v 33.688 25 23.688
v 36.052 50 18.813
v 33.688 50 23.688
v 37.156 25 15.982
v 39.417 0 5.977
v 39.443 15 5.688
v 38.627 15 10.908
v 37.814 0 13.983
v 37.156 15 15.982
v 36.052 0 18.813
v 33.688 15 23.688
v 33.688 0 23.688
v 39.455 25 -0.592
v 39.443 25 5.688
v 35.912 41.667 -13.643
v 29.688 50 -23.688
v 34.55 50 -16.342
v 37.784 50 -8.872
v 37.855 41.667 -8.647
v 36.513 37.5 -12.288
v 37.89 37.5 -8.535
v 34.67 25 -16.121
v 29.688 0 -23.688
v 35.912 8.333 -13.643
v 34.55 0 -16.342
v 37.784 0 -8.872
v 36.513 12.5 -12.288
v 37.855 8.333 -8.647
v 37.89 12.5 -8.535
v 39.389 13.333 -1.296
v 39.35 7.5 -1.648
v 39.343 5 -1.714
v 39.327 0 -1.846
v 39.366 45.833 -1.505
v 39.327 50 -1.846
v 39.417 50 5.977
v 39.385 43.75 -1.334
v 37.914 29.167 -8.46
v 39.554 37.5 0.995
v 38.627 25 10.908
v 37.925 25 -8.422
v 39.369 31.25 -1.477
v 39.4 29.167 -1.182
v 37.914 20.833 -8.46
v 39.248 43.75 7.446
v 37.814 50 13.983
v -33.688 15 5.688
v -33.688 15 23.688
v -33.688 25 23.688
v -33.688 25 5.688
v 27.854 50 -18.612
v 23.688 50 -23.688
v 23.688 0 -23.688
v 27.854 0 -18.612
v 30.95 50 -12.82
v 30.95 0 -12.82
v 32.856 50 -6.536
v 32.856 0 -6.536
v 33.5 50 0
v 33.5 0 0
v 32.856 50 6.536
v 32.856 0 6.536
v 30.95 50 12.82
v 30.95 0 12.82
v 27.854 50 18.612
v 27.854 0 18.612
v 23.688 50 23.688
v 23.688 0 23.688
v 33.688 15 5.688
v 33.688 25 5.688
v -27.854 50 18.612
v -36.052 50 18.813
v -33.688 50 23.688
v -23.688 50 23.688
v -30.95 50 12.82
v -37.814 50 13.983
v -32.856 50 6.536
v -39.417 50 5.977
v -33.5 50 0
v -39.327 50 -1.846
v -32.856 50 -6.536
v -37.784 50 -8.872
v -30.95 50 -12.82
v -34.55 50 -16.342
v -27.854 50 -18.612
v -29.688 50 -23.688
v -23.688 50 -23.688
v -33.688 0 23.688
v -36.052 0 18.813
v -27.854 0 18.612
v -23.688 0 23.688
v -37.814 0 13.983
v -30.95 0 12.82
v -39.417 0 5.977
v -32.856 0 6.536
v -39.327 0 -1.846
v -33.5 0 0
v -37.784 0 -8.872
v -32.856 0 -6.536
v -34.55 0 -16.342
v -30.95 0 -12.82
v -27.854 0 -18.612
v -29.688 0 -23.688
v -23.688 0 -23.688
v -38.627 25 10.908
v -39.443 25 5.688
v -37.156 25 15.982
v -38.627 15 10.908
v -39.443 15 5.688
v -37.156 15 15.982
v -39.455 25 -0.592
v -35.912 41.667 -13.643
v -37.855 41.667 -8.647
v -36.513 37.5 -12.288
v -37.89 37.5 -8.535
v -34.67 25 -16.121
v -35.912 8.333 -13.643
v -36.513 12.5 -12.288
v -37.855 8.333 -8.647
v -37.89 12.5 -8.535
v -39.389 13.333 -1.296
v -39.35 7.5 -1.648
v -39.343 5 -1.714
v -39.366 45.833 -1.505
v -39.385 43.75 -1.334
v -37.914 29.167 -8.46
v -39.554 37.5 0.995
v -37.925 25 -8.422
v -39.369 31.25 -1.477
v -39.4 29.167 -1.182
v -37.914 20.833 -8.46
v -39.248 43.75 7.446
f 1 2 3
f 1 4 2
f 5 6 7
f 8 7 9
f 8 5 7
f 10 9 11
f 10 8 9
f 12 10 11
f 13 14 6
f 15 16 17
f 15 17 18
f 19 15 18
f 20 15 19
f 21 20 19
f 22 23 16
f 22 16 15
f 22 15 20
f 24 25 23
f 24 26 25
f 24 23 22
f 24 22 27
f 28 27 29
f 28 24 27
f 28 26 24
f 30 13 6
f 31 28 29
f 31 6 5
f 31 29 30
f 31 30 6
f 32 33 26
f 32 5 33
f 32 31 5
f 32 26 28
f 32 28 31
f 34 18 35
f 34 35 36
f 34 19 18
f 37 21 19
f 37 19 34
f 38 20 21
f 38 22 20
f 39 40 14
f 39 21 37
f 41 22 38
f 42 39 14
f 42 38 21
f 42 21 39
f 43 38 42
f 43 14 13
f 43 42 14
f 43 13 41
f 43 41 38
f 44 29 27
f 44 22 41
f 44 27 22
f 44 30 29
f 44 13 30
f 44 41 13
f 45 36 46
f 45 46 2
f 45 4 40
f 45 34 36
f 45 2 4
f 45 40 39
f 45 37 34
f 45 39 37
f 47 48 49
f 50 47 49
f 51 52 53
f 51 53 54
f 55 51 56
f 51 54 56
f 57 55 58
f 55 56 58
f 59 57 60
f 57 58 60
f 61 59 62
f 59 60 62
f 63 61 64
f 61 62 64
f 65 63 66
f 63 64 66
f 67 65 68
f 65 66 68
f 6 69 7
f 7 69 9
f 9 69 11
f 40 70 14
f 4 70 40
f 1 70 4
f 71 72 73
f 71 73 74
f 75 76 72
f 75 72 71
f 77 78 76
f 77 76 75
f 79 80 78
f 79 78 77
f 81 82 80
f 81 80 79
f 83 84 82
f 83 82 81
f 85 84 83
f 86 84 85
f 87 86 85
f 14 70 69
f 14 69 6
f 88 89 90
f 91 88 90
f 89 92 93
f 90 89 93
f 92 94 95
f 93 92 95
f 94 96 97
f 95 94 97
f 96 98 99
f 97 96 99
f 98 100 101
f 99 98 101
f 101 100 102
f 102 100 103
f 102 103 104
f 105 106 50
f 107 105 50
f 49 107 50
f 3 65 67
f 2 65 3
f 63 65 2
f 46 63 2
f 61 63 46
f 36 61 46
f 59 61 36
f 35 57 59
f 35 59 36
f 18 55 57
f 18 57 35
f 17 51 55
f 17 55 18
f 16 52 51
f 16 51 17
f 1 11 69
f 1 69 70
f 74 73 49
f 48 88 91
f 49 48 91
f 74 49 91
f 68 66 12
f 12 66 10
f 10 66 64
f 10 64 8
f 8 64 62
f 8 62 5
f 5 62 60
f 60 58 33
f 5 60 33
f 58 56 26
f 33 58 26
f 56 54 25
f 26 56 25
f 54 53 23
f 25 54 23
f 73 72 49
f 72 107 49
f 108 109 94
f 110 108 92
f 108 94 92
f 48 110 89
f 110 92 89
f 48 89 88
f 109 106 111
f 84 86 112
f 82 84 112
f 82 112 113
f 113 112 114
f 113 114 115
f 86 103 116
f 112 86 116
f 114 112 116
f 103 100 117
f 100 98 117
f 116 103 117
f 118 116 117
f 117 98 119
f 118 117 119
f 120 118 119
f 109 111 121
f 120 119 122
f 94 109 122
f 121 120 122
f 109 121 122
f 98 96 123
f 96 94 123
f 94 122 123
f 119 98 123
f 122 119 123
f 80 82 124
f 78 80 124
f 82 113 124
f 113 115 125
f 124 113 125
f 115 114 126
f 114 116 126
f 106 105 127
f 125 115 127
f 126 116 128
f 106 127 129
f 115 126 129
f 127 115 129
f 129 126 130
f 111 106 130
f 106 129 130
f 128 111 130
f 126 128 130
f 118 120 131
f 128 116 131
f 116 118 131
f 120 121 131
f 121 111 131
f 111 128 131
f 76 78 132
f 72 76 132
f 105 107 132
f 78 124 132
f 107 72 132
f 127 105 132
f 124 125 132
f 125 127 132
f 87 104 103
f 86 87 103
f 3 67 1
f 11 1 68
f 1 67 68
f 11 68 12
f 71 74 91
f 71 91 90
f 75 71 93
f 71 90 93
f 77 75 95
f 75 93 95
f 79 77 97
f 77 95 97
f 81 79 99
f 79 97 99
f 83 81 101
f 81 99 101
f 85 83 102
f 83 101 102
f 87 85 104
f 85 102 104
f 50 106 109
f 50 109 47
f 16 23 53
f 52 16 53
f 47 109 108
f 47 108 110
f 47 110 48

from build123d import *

# Parameters (mm, degrees)
BOSS_EXTRUDE1_DEPTH   = 50
BOSS_EXTRUDE1_2_DEPTH = 50
SKETCH3_W             = 8
SKETCH3_H             = 10
CUT_EXTRUDE5_DEPTH    = 18


with BuildPart() as part:
    # Sketch2 → Boss-Extrude1 (new body)
    with BuildSketch(Plane(origin=(0, 0, 0), x_dir=(1, 0, 0), z_dir=(0, 1, 0))):
        with BuildLine():
            ThreePointArc((-23.68807717, -23.68807717), (-33.5, 0), (-23.68807717, 23.68807717))
            Line((-23.68807717, 23.68807717), (-29.68807717, 23.68807717))
            add(Edge.make_bspline(
                [(-29.68807717, 23.68807717), (-47.221735333, 1.183613852), (-33.68807717, -23.68807717)],
                knots=[0, 0, 0, 1, 1, 1], degree=2))
            Line((-33.68807717, -23.68807717), (-23.68807717, -23.68807717))
        make_face()
    extrude(amount=BOSS_EXTRUDE1_DEPTH)


with BuildPart() as body_2:
    # Sketch2 → Boss-Extrude1 2 (new body)
    with BuildSketch(Plane(origin=(0, 0, 0), x_dir=(1, 0, 0), z_dir=(0, 1, 0))):
        with BuildLine():
            Line((29.68807717, 23.68807717), (23.68807717, 23.68807717))
            ThreePointArc((23.68807717, 23.68807717), (33.5, 0), (23.68807717, -23.68807717))
            Line((23.68807717, -23.68807717), (33.68807717, -23.68807717))
            add(Edge.make_bspline(
                [(29.68807717, 23.68807717), (47.221735333, 1.183613852), (33.68807717, -23.68807717)],
                knots=[0, 0, 0, 1, 1, 1], degree=2))
        make_face()
    extrude(amount=BOSS_EXTRUDE1_2_DEPTH)


with BuildPart() as cut_extrude5_tool:
    # Sketch3 → Cut-Extrude5 (new body)
    with BuildSketch(Plane.XY.offset(23.68807717)):
        with Locations((-37.68807717, 20)):
            Rectangle(SKETCH3_W, SKETCH3_H)
        with Locations((37.68807717, 20)):
            Rectangle(SKETCH3_W, SKETCH3_H)
    extrude(amount=-CUT_EXTRUDE5_DEPTH)


with BuildPart() as part_1:
    add(part.part)

    # Cut-Extrude5: cut by cut_extrude5_tool
    add(cut_extrude5_tool.part, mode=Mode.SUBTRACT)


with BuildPart() as body_2_1:
    add(body_2.part)

    # Cut-Extrude5: cut by cut_extrude5_tool
    add(cut_extrude5_tool.part, mode=Mode.SUBTRACT)


solid = Compound([part_1.part, body_2_1.part])
